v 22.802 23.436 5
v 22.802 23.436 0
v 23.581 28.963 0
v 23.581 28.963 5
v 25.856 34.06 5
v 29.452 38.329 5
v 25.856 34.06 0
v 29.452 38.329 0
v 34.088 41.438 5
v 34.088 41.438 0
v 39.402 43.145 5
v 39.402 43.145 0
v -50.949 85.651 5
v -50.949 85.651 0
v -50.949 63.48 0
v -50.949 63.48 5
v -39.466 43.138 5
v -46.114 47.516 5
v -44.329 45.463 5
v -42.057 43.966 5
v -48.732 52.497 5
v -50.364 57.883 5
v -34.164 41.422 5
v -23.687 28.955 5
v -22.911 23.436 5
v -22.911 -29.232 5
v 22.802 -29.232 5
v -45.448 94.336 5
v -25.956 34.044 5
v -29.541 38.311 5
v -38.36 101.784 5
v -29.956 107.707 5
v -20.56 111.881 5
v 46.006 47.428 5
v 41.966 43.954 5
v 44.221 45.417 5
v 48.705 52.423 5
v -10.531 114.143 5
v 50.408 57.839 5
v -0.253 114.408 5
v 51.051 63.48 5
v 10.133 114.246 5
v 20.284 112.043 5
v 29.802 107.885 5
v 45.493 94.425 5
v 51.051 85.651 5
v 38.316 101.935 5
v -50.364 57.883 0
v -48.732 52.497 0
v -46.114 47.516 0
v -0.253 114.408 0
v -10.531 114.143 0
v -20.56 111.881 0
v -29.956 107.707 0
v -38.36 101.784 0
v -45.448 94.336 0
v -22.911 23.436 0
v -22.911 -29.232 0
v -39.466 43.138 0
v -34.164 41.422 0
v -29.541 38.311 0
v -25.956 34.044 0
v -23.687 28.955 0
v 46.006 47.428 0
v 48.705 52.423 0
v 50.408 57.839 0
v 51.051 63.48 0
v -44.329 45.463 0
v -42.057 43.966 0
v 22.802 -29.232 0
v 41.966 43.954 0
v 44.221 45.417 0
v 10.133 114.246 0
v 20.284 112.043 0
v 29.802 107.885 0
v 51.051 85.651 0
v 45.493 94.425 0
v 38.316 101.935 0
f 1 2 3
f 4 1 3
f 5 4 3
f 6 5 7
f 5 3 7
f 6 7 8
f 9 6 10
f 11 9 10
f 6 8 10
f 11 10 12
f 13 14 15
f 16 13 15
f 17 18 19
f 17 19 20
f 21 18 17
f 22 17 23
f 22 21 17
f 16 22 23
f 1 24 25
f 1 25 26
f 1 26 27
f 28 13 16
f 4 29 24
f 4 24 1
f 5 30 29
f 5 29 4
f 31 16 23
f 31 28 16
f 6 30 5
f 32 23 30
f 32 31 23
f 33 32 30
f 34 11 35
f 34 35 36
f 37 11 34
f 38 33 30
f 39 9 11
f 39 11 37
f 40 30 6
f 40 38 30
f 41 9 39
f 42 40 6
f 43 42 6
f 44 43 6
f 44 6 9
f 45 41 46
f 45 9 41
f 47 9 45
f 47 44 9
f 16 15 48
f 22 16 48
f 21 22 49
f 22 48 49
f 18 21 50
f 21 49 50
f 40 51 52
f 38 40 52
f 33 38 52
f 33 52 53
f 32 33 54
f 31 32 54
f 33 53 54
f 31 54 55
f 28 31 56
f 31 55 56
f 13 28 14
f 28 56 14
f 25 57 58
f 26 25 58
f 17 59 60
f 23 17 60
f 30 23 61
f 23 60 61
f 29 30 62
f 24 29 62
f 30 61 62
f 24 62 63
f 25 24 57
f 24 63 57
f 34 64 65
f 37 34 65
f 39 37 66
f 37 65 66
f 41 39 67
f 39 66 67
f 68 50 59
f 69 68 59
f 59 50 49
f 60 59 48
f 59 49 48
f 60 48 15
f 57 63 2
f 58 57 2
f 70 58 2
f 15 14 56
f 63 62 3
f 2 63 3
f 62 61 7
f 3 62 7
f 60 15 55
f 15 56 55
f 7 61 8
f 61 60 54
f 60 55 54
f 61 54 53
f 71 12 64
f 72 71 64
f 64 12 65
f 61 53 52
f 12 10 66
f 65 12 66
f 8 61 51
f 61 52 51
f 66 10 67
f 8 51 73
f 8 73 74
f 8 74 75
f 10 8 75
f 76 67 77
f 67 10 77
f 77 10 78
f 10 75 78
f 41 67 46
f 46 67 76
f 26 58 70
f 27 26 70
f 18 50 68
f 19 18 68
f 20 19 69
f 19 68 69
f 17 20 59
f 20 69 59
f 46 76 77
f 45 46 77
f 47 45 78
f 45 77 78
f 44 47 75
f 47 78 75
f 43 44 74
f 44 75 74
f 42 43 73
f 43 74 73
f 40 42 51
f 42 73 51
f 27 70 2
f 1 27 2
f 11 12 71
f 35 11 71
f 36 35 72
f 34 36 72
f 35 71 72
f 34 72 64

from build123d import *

# Parameters (mm, degrees)
EXTRUDE_1_DEPTH = 5


with BuildPart() as part:
    # Эскиз1 → Вытянуть1 (new body)
    with BuildSketch(Plane.XY):
        with BuildLine():
            Line((51.051218407, 63.479620652), (51.051218407, 85.650578056))
            ThreePointArc((51.051218407, 85.650578056), (29.802221193, 107.884883156), (-0.253175823, 114.408480022))
            ThreePointArc((-0.253175823, 114.408480022), (-29.956404055, 107.707451089), (-50.948781593, 85.650578205))
            Line((-50.948781593, 85.650578205), (-50.948781593, 63.479620652))
            ThreePointArc((-50.948781593, 63.479620652), (-49.676003697, 55.151129839), (-46.113662299, 47.516115329))
            ThreePointArc((-46.113662299, 47.516115329), (-43.24429549, 44.636868096), (-39.466032041, 43.137516297))
            ThreePointArc((-39.466032041, 43.137516297), (-27.599168456, 36.303107276), (-22.910878505, 23.436424124))
            Line((-22.910878505, 23.436424124), (-22.910878505, -29.232372122))
            Line((-22.910878505, -29.232372122), (22.801652741, -29.232372122))
            Line((22.801652741, -29.232372122), (22.801652741, 23.436424124))
            ThreePointArc((22.801652741, 23.436424124), (27.504627406, 36.320562274), (39.401754329, 43.145322895))
            ThreePointArc((39.401754329, 43.145322895), (43.142841115, 44.60959187), (46.005754814, 47.428020354))
            ThreePointArc((46.005754814, 47.428020354), (49.685829012, 55.090035656), (51.051218407, 63.479620652))
        make_face()
    extrude(amount=EXTRUDE_1_DEPTH)


solid = part.part
